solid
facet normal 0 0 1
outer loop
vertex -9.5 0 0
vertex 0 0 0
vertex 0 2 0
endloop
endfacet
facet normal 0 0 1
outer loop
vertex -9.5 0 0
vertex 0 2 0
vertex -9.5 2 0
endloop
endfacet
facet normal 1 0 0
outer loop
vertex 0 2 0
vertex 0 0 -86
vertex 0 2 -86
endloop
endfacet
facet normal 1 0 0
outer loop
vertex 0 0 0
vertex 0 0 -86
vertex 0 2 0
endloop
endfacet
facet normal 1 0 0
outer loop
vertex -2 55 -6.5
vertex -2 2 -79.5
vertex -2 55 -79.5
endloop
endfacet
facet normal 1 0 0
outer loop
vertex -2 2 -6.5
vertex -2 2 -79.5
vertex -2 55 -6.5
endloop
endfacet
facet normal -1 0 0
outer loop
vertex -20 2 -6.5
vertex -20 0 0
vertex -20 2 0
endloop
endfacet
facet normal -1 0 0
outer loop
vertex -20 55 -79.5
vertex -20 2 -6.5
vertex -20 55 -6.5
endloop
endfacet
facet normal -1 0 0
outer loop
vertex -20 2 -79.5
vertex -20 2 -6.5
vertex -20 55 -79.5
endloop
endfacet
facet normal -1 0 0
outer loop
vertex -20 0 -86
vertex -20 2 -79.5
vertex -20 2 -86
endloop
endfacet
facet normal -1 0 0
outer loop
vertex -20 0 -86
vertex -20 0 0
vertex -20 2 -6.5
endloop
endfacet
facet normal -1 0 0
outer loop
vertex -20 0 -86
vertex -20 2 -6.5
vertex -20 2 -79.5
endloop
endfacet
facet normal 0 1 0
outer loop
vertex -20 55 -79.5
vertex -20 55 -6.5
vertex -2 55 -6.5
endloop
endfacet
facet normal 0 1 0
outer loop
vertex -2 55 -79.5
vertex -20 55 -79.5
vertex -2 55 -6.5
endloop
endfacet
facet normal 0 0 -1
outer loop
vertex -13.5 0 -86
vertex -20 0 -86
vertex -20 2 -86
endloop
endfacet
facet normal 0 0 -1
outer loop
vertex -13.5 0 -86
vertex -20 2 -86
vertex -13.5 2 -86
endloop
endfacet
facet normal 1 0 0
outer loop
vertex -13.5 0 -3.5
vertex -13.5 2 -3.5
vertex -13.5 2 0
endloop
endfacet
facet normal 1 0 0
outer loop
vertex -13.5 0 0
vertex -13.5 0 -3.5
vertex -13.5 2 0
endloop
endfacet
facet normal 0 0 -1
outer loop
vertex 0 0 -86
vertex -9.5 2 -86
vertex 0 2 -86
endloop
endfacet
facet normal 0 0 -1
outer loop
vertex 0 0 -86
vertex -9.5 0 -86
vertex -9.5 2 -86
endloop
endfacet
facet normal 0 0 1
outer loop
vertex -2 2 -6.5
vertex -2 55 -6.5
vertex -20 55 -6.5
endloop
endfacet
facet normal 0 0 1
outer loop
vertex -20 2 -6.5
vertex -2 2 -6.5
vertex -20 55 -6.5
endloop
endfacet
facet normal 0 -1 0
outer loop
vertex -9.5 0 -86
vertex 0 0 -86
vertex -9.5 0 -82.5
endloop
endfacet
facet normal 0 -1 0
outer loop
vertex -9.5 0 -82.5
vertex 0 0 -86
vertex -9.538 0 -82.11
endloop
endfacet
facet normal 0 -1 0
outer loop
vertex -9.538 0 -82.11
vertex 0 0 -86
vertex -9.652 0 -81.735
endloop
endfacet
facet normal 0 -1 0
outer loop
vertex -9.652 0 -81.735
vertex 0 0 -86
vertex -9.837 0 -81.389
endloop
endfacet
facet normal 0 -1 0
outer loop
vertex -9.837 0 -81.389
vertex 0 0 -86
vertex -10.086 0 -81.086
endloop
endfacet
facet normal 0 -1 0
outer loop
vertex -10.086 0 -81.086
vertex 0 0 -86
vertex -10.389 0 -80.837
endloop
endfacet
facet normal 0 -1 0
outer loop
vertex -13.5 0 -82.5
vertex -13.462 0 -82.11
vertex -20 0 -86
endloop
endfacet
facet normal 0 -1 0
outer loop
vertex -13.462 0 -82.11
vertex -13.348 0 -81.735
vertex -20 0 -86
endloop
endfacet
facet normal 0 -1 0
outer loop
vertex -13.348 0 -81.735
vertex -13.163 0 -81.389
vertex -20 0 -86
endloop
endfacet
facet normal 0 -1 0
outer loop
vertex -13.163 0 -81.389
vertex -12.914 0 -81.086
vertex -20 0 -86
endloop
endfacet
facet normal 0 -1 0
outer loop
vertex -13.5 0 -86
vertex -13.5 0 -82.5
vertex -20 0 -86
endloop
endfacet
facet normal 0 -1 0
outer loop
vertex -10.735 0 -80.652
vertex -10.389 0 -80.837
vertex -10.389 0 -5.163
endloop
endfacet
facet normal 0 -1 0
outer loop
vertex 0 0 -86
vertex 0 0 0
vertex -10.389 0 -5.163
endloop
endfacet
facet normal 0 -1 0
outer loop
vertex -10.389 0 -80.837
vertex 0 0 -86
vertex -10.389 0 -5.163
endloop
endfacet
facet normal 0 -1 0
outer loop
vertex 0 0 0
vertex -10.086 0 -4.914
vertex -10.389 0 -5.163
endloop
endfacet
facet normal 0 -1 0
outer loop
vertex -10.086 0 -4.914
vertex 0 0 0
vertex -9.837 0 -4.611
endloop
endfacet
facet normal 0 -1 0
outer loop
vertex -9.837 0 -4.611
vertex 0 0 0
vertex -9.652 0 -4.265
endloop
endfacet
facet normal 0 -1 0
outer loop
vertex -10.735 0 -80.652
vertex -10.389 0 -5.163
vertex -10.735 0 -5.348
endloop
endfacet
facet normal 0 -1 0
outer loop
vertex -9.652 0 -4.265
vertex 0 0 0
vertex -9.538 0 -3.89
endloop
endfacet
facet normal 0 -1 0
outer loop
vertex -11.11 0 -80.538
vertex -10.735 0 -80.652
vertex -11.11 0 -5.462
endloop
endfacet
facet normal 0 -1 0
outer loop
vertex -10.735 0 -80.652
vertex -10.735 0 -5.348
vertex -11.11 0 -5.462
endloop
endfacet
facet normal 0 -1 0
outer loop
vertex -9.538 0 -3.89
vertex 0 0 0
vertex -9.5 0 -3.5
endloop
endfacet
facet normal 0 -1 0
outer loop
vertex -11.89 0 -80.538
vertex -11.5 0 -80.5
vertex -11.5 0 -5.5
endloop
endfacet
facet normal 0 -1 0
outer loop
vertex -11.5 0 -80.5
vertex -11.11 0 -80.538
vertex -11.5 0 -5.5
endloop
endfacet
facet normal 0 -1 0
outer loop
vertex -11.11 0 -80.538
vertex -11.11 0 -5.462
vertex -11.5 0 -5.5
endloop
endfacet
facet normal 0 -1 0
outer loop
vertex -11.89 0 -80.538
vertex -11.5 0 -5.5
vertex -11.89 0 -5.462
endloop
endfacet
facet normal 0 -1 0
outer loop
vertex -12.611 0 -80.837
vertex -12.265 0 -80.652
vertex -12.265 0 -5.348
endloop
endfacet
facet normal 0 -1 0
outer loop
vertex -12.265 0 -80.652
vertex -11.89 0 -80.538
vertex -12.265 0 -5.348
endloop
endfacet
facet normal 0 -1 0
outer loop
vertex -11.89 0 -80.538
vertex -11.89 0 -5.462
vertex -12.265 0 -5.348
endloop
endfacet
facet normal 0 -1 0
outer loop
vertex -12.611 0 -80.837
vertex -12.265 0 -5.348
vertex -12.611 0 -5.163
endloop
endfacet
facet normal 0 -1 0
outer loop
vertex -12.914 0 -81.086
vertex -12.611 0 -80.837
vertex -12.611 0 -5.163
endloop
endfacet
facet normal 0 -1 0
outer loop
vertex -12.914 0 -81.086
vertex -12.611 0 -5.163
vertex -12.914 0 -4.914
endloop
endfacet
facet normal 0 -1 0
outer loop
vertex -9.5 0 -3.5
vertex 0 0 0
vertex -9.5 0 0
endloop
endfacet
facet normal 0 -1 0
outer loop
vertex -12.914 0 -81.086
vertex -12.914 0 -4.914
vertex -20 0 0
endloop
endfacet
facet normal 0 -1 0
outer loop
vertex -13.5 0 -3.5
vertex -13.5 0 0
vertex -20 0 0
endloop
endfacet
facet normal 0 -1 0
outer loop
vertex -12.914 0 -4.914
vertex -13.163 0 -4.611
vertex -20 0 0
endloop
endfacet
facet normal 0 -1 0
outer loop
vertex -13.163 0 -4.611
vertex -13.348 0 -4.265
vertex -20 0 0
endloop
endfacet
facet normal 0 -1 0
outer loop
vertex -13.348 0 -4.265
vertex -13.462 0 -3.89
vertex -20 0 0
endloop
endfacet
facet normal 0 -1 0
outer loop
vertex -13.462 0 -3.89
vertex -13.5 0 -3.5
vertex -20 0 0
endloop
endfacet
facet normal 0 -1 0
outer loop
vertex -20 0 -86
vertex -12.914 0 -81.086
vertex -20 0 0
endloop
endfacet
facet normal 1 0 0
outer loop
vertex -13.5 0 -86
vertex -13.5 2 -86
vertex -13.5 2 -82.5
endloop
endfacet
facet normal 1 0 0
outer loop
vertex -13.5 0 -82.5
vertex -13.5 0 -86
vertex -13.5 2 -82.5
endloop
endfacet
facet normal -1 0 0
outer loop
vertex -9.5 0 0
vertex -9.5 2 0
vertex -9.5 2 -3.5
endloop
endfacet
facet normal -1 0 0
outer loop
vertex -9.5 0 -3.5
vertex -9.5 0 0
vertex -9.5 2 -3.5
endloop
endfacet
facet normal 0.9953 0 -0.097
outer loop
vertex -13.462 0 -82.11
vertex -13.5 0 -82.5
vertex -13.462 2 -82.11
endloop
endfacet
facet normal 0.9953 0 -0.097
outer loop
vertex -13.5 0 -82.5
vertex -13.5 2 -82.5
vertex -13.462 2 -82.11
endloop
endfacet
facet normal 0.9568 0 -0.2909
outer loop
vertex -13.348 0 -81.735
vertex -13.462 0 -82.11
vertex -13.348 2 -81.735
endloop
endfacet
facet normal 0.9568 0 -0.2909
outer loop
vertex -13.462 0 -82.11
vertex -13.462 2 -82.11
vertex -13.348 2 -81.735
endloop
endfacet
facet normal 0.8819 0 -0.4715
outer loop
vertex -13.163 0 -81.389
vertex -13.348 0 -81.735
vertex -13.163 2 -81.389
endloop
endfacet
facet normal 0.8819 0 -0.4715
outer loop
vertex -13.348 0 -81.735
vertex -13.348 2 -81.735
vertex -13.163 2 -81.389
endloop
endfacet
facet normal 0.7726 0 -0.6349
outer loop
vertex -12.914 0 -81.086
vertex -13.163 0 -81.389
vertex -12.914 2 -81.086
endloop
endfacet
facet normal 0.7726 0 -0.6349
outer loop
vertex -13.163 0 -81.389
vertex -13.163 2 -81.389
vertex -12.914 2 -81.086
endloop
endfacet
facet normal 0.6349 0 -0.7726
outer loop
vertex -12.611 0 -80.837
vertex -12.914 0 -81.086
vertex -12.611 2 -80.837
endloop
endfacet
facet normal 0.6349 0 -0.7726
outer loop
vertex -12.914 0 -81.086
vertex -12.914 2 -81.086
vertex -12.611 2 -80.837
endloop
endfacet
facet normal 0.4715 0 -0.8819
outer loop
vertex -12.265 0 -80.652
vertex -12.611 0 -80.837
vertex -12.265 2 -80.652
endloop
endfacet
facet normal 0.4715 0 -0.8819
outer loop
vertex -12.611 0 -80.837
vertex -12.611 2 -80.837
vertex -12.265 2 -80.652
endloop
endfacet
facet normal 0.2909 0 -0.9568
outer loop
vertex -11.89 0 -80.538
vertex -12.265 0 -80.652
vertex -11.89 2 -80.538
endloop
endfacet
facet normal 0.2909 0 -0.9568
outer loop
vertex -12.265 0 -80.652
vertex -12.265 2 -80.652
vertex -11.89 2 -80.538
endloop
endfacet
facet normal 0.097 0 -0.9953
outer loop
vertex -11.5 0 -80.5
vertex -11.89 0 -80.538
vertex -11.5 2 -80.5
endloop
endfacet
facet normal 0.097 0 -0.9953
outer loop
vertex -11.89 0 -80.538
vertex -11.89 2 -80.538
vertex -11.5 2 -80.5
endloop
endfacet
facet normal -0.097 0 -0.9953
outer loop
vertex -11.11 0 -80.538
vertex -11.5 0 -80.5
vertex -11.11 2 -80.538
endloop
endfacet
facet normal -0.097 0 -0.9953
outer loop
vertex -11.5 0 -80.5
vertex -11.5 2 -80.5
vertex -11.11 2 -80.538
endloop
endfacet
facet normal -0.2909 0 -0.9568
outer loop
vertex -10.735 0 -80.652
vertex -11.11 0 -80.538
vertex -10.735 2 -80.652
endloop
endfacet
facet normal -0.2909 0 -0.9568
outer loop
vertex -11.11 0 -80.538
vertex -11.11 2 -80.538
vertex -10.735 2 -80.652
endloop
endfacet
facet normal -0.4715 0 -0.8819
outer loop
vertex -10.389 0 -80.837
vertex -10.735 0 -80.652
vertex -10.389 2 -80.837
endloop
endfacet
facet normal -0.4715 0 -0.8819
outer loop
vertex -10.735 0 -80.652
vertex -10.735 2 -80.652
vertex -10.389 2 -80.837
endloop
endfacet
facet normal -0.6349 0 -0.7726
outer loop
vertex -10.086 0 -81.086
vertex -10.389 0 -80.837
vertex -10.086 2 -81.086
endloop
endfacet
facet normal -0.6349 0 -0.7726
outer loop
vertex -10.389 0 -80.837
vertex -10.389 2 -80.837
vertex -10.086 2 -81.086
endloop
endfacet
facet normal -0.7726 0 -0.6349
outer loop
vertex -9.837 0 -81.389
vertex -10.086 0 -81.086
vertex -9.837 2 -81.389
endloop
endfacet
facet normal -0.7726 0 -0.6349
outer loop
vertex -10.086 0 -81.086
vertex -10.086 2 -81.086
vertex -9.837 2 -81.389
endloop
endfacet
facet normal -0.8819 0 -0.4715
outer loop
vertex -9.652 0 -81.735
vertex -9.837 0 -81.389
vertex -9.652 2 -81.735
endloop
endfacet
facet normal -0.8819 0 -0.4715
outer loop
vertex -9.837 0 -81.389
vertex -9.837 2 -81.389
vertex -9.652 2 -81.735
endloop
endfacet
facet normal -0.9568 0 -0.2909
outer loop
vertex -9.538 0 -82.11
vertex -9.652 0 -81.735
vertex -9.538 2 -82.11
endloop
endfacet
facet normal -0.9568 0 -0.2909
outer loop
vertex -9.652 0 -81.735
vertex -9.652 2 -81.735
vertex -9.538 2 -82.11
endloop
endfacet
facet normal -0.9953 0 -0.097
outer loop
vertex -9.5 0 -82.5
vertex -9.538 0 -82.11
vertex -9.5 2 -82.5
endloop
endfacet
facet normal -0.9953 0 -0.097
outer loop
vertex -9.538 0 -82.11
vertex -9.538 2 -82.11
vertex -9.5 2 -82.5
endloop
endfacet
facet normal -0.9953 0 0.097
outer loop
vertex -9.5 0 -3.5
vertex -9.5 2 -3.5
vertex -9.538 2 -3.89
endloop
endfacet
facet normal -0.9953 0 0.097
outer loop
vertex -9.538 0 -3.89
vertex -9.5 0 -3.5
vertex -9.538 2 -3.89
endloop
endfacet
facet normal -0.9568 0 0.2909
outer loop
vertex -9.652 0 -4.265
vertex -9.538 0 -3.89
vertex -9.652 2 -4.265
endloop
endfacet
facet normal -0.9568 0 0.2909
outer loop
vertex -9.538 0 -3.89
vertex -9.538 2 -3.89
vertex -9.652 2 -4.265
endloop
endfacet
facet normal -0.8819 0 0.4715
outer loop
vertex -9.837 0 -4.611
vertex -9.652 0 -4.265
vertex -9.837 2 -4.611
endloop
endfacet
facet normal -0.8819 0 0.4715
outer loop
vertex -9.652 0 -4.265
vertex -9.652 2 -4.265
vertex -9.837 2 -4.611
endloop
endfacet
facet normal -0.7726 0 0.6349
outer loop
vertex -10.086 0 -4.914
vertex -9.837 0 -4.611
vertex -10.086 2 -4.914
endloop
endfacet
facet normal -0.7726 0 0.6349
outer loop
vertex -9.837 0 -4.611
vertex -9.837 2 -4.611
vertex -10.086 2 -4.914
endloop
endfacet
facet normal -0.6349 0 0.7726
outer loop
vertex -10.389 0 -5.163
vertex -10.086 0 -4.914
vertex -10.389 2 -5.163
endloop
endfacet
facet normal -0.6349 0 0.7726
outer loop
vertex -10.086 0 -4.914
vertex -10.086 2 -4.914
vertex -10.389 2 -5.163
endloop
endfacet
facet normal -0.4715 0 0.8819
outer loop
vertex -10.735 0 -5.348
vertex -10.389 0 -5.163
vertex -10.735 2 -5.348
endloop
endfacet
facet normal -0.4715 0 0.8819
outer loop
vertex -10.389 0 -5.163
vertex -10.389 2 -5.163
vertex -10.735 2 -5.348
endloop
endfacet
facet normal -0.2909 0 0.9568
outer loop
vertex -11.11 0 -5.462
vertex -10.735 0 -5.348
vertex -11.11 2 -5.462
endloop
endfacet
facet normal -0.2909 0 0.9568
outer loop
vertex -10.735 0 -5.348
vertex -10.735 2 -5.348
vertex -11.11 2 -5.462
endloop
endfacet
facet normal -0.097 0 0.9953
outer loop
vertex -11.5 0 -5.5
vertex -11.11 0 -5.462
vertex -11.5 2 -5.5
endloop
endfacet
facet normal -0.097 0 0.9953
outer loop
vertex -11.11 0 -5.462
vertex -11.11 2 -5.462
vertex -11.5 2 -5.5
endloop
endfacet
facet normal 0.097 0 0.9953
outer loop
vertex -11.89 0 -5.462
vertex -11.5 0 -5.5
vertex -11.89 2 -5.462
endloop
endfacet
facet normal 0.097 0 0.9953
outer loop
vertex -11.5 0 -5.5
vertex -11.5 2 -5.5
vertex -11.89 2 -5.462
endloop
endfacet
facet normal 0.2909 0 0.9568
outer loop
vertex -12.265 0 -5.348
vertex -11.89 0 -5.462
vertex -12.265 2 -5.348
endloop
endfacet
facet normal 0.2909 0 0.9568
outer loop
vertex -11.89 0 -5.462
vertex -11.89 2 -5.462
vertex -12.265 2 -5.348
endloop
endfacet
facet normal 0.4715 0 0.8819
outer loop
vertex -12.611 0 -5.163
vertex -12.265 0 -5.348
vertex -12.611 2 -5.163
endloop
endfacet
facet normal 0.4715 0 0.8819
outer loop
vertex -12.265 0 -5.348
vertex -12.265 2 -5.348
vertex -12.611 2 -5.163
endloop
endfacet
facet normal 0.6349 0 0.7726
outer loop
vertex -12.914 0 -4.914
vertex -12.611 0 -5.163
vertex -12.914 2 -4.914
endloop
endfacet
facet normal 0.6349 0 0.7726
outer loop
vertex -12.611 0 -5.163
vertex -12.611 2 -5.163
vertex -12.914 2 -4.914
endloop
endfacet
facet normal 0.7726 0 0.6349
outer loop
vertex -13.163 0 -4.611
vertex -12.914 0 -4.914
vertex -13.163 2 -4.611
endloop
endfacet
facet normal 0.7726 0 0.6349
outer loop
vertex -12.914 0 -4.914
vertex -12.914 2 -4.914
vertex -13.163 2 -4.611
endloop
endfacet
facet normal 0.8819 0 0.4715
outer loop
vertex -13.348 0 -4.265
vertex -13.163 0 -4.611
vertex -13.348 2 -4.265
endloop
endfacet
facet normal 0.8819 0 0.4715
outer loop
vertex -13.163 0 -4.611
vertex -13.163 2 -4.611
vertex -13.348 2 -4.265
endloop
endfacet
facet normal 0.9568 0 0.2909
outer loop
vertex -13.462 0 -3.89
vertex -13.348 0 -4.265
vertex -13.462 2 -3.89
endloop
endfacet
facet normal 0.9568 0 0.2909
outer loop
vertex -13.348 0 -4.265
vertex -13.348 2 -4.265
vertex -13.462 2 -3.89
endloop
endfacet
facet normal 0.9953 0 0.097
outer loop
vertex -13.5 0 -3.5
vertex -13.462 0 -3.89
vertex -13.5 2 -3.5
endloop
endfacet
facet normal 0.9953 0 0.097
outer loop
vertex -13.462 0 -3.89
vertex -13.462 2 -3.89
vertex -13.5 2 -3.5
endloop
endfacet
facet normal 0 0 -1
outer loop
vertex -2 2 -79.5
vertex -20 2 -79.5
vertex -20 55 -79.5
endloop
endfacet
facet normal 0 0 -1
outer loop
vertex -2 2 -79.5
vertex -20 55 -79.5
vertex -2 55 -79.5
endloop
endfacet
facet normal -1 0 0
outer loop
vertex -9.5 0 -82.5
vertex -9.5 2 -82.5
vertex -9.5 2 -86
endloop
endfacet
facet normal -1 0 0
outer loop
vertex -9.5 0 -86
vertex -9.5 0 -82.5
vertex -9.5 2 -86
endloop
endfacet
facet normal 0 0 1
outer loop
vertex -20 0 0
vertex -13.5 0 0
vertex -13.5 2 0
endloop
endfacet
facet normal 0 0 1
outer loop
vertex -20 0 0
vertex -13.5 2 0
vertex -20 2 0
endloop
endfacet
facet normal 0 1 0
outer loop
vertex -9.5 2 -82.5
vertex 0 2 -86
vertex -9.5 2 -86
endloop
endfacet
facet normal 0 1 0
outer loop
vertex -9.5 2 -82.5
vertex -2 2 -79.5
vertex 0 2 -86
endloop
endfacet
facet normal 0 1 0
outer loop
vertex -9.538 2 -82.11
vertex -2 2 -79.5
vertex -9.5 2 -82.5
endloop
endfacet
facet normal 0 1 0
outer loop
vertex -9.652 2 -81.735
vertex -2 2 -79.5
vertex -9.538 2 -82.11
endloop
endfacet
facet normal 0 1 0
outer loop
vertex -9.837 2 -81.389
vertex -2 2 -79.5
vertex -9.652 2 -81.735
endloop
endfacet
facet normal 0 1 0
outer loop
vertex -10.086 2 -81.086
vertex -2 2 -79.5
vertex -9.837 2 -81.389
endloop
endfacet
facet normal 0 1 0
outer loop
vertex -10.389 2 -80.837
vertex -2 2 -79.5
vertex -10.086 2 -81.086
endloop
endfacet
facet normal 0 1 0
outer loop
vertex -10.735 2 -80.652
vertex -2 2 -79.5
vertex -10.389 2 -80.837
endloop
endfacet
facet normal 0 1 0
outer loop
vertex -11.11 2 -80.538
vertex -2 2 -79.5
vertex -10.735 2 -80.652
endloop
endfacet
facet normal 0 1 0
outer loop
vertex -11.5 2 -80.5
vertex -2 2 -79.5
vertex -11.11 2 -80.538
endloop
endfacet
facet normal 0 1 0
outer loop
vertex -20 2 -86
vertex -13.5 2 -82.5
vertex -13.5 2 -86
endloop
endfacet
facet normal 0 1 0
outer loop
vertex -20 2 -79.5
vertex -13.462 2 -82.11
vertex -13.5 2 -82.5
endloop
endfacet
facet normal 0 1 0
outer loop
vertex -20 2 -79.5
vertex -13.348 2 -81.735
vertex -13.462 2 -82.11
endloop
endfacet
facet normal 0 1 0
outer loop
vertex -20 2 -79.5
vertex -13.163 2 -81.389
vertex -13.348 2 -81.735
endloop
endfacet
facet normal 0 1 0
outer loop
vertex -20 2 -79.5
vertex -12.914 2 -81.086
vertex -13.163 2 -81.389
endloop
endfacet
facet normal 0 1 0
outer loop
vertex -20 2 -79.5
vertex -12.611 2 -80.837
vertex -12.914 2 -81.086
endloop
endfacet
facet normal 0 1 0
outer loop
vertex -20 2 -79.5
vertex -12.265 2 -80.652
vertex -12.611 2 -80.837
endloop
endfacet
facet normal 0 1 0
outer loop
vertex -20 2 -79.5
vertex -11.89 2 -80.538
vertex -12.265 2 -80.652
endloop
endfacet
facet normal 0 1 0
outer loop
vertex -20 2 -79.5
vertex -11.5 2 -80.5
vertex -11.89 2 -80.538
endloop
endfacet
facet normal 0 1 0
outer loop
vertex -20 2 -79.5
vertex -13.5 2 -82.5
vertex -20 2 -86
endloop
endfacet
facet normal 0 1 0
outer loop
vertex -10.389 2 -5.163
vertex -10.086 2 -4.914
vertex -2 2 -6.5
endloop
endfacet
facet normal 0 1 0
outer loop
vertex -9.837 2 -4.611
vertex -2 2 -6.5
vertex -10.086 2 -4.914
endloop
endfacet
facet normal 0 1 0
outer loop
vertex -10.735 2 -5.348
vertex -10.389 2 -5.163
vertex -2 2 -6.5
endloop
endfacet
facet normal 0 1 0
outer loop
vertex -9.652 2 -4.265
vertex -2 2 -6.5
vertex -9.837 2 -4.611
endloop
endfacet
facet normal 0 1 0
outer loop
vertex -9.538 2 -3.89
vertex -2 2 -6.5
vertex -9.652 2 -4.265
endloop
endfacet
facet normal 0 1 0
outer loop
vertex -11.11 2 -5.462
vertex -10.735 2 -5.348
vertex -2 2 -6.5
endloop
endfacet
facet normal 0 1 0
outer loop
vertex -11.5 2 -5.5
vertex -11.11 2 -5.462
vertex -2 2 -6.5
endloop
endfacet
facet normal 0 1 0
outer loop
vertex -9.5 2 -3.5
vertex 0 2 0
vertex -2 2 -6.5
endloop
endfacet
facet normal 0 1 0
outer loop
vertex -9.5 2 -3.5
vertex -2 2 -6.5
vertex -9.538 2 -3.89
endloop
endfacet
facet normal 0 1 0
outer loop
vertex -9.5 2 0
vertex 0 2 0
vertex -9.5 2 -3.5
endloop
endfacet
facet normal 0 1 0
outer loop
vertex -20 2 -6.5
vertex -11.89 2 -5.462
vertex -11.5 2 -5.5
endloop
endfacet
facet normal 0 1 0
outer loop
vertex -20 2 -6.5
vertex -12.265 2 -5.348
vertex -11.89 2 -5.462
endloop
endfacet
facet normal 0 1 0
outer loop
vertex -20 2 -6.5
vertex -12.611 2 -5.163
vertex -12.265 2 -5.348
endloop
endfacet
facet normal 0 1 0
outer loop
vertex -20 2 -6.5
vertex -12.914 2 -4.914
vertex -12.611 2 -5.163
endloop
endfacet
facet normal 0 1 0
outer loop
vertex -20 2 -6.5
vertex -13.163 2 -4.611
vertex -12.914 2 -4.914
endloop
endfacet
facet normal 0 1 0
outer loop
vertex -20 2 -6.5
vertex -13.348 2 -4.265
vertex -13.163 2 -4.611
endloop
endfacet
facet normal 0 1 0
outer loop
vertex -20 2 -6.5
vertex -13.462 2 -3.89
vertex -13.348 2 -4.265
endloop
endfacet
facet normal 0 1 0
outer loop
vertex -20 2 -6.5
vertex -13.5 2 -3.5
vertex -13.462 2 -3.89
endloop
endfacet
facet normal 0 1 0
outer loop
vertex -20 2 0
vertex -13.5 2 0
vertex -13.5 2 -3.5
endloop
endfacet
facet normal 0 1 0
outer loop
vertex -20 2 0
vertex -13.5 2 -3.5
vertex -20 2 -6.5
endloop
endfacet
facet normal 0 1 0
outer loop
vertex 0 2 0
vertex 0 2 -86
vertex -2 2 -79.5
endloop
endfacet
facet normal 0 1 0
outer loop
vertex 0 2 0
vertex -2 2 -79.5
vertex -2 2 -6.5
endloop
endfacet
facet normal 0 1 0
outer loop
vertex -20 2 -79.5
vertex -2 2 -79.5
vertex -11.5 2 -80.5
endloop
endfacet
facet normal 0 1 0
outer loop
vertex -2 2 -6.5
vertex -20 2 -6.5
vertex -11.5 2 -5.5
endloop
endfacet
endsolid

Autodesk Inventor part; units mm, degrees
ref_plane "YZ Plane" through (0, 0, 0) normal (1, 0, 0) x (0, 1, 0)
ref_plane "XZ Plane" through (0, 0, 0) normal (0, 1, 0) x (-1, 0, 0)
ref_plane "XY Plane" through (0, 0, 0) normal (0, 0, 1) x (1, 0, 0)
sketch "Sketch1" plane through (0, 0, 0) normal (0, 1, 0) x (-1, 0, 0)
  line L0 (0, 0) -> (20, 0)
  line L1 (20, 0) -> (20, -86)
  line L2 (20, -86) -> (0, -86)
  line L3 (0, -86) -> (0, 0)
  dimension "d0" = 20
  dimension "d1" = 86
extrude "Extrusion1" add sketch "Sketch1" along normal blind 2
sketch "Sketch2" plane through (0, 2, 0) normal (0, 1, 0) x (1, 0, 0)
  line L0 (0, 0) -> (0, 86) projected
  line L1 (0, 0) -> (-11.5, 0)
  line L2 (-20, 0) -> (0, 0) projected
  line L3 (-11.5, -3.5) -> (-11.5, 3.5) construction
  line L4 (-9.5, -3.5) -> (-9.5, 3.5)
  line L5 (-13.5, 3.5) -> (-13.5, -3.5)
  arc A0 (-13.5, -3.5) -> (-9.5, -3.5) centre (-11.5, -3.5) ccw
  arc A1 (-9.5, 3.5) -> (-13.5, 3.5) centre (-11.5, 3.5) ccw
  line L6 (-11.5, 89.5) -> (-11.5, 82.5) construction
  line L7 (0, 86) -> (-20, 86) projected
  line L8 (-13.5, 89.5) -> (-13.5, 82.5)
  line L9 (-9.5, 82.5) -> (-9.5, 89.5)
  arc A2 (-9.5, 89.5) -> (-13.5, 89.5) centre (-11.5, 89.5) ccw
  arc A3 (-13.5, 82.5) -> (-9.5, 82.5) centre (-11.5, 82.5) ccw
  line L10 (-11.5, 86) -> (-4.5, 86) construction
  dimension "d4" = 11.5
  dimension "d5" = 3.5
  dimension "d6" = 4
  dimension "d7" = 3.5
  dimension "d8" = 90
  dimension "d9" = 4
  dimension "d10" = 11.5
extrude "Extrusion2" cut sketch "Sketch2" against normal blind 2
sketch "Sketch3" plane through (0, 2, 0) normal (0, 1, 0) x (1, 0, 0)
  arc A0 (-9.5, 3.5) -> (-13.5, 3.5) centre (-11.5, 3.5) ccw projected
  line L0 (-11.5, 3.5) -> (-11.5, 6.5)
  arc A1 (-13.5, 82.5) -> (-9.5, 82.5) centre (-11.5, 82.5) ccw projected
  line L1 (-11.5, 82.5) -> (-11.5, 79.5)
  line L2 (-11.5, 79.5) -> (-20, 79.5)
  line L3 (-20, 0) -> (-20, 86) projected
  line L4 (-11.5, 6.5) -> (-2, 6.5)
  line L5 (0, 86) -> (0, 0) projected
  line L6 (-2, 6.5) -> (-20, 6.5)
  line L7 (-20, 6.5) -> (-20, 79.5)
  line L8 (-20, 79.5) -> (-2, 79.5)
  line L9 (-2, 79.5) -> (-2, 6.5)
  dimension "d13" = 3
  dimension "d14" = 3
  dimension "d15" = 9.5
extrude "Extrusion3" add sketch "Sketch3" along normal blind 53
properties part number "DM332T_Stepper"
